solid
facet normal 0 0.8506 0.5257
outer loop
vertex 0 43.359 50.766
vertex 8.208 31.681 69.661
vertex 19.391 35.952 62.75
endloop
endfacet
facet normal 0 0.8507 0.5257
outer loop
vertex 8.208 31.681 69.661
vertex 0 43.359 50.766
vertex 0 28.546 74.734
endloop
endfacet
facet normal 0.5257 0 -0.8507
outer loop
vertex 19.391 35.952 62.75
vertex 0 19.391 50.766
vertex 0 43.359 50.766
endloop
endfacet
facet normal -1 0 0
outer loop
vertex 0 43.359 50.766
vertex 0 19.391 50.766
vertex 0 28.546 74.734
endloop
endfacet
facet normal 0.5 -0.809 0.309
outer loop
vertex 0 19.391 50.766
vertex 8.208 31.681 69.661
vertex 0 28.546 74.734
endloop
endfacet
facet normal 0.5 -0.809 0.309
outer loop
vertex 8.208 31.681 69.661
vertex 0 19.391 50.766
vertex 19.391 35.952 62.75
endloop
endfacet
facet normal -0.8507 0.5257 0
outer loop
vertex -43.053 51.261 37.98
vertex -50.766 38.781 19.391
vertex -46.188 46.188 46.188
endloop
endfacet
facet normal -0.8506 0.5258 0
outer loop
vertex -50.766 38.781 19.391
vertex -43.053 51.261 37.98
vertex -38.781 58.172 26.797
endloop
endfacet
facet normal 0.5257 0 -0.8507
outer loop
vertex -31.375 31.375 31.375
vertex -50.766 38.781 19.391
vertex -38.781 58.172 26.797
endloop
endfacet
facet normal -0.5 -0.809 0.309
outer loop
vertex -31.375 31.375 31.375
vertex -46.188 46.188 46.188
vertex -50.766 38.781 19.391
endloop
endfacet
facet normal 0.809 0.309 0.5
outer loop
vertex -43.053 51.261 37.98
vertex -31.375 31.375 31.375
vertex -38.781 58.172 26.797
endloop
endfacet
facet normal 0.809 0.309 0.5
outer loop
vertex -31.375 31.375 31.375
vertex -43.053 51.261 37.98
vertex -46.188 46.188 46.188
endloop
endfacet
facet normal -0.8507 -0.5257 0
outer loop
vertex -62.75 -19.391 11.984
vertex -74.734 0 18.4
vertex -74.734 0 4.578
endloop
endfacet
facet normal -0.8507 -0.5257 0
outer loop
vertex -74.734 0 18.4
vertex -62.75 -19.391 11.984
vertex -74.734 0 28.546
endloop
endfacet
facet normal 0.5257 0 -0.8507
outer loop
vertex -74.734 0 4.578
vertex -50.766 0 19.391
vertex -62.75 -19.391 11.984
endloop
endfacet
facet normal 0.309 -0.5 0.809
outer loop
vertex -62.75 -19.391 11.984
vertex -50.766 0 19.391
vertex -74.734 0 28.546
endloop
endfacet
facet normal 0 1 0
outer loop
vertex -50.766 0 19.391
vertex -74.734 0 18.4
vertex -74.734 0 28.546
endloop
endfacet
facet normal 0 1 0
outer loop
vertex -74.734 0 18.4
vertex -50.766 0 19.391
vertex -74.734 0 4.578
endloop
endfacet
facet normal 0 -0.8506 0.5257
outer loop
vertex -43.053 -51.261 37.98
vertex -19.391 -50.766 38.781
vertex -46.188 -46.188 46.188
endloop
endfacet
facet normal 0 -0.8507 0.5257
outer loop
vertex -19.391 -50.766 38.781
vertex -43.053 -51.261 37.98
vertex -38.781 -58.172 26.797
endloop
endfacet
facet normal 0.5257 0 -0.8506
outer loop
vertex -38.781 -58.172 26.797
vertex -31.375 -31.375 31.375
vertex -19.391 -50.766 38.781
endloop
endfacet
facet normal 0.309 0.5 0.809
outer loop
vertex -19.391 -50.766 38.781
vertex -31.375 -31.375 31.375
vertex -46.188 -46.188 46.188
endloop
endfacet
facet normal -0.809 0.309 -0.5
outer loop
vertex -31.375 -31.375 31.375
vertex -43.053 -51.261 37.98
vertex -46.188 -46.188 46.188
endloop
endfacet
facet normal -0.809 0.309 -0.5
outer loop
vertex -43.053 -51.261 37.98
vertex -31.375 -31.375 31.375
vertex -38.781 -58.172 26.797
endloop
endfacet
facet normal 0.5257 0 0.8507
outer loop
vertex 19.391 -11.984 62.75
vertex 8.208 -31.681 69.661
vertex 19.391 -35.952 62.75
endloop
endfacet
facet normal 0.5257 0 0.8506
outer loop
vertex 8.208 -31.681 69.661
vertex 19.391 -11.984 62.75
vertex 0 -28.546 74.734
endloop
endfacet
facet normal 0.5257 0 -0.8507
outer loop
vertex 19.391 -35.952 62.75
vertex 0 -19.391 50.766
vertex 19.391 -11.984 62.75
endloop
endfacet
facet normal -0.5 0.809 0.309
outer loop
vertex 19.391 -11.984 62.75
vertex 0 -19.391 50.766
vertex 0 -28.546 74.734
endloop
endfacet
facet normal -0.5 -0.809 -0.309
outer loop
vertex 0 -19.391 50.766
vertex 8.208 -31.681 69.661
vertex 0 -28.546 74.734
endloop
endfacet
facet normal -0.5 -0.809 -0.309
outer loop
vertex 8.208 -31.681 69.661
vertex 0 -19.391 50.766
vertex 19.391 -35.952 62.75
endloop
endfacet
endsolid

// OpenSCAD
// file: def.scad
inf = 1000;

round_radius = 1;
sticker_margin = 2.5;
sticker_round_radius = 0.75;

phi = (sqrt(5) + 1) / 2;
outer_radius = 80;
edge_length = outer_radius / sqrt(phi * phi * phi * phi + 1) * 2;
inner_radius = sqrt(outer_radius * outer_radius - (edge_length / 2 / cos(54)) * (edge_length / 2 / cos(54)));
cut1_length = edge_length / (1 / (phi * phi) + 2) * 3;
center_cut_length = edge_length * (sin(54) + 1);
cut1_dis = inner_radius * (center_cut_length - cut1_length) / (center_cut_length - edge_length);

theta = atan(edge_length / 2 * tan(54) / inner_radius);

face_inner_radius = edge_length / 2 * tan(54);
face_center_length = edge_length * tan(54) / cos(18);
sticker_cut1_dis = face_inner_radius * (face_center_length - cut1_length) / (face_center_length - edge_length);
sticker_dif_cut1_dis = sticker_cut1_dis - round_radius * tan(theta) + round_radius - sticker_margin;
sticker_int_cut1_dis = sticker_cut1_dis + round_radius / tan(theta) - round_radius + sticker_margin;
sticker_dif_cut2_dis = face_inner_radius - round_radius * tan(theta) + round_radius - sticker_margin;

module _int_cut1() {
    translate([-inf, -inf, cut1_dis + round_radius])
        cube([inf * 2, inf * 2, inf]);
}

module _dif_cut1() {
    translate([-inf, -inf, cut1_dis - round_radius])
        cube([inf * 2, inf * 2, inf]);
}

module _sticker_int_cut1() {
    rotate([-90, 0, 0])
        translate([-inf, -inf, sticker_int_cut1_dis])
            cube([inf * 2, inf * 2, inf]);
}

module _sticker_dif_cut1() {
    rotate([-90, 0, 0])
        translate([-inf, -inf, sticker_dif_cut1_dis])
            cube([inf * 2, inf * 2, inf]);
}

module _sticker_dif_cut2() {
    rotate([-90, 0, 0])
        translate([-inf, -inf, sticker_dif_cut2_dis])
            cube([inf * 2, inf * 2, inf]);
}

module _base() {
    intersection_for(vec = [[0, 0, 0], [90, 90, 0], [90, 0, 90]])
        intersection_for(ang = [theta, -theta, 180 + theta, 180 - theta])
            rotate(vec)
                rotate([0, ang, 0])
                    translate([-inf, -inf, -inner_radius + round_radius])
                        cube([inf * 2, inf * 2, inf]);
}

module _sticker_base() {
    difference() {
        cube([inf, inf, 0.1], center = true);
        for (ang = [0 : 72 : 288])
            rotate([0, 0, ang])
                _sticker_dif_cut2();
    }
}

module _selector_base(dis) {
    intersection_for(vec = [[0, 0, 0], [90, 90, 0], [90, 0, 90]])
        intersection_for(ang = [theta, -theta, 180 + theta, 180 - theta])
            rotate(vec)
                rotate([0, ang, 0])
                    translate([-inf, -inf, -dis])
                        cube([inf * 2, inf * 2, inf]);
}
// main file
include <def.scad>

module selector_cw() {
    difference() {
        intersection() {
            _selector_base(inner_radius);
            rotate([0, -theta, 0])
                translate([-inf, -inf, cut1_dis])
                    cube([inf * 2, inf * 2, inf]);
        }
        rotate([0, -90, 0])
            translate([-inf, -inf, 0])
                cube([inf * 2, inf * 2, inf]);
        rotate([0, -theta, 0])
            rotate([90, 0, 36])
                translate([-inf, -inf, 0])
                    cube([inf * 2, inf * 2, inf]);
    }
}

for (ang = [0 : 72 : 288])
    rotate([0, -theta, 0])
        rotate([0, theta, ang])
            selector_cw();
